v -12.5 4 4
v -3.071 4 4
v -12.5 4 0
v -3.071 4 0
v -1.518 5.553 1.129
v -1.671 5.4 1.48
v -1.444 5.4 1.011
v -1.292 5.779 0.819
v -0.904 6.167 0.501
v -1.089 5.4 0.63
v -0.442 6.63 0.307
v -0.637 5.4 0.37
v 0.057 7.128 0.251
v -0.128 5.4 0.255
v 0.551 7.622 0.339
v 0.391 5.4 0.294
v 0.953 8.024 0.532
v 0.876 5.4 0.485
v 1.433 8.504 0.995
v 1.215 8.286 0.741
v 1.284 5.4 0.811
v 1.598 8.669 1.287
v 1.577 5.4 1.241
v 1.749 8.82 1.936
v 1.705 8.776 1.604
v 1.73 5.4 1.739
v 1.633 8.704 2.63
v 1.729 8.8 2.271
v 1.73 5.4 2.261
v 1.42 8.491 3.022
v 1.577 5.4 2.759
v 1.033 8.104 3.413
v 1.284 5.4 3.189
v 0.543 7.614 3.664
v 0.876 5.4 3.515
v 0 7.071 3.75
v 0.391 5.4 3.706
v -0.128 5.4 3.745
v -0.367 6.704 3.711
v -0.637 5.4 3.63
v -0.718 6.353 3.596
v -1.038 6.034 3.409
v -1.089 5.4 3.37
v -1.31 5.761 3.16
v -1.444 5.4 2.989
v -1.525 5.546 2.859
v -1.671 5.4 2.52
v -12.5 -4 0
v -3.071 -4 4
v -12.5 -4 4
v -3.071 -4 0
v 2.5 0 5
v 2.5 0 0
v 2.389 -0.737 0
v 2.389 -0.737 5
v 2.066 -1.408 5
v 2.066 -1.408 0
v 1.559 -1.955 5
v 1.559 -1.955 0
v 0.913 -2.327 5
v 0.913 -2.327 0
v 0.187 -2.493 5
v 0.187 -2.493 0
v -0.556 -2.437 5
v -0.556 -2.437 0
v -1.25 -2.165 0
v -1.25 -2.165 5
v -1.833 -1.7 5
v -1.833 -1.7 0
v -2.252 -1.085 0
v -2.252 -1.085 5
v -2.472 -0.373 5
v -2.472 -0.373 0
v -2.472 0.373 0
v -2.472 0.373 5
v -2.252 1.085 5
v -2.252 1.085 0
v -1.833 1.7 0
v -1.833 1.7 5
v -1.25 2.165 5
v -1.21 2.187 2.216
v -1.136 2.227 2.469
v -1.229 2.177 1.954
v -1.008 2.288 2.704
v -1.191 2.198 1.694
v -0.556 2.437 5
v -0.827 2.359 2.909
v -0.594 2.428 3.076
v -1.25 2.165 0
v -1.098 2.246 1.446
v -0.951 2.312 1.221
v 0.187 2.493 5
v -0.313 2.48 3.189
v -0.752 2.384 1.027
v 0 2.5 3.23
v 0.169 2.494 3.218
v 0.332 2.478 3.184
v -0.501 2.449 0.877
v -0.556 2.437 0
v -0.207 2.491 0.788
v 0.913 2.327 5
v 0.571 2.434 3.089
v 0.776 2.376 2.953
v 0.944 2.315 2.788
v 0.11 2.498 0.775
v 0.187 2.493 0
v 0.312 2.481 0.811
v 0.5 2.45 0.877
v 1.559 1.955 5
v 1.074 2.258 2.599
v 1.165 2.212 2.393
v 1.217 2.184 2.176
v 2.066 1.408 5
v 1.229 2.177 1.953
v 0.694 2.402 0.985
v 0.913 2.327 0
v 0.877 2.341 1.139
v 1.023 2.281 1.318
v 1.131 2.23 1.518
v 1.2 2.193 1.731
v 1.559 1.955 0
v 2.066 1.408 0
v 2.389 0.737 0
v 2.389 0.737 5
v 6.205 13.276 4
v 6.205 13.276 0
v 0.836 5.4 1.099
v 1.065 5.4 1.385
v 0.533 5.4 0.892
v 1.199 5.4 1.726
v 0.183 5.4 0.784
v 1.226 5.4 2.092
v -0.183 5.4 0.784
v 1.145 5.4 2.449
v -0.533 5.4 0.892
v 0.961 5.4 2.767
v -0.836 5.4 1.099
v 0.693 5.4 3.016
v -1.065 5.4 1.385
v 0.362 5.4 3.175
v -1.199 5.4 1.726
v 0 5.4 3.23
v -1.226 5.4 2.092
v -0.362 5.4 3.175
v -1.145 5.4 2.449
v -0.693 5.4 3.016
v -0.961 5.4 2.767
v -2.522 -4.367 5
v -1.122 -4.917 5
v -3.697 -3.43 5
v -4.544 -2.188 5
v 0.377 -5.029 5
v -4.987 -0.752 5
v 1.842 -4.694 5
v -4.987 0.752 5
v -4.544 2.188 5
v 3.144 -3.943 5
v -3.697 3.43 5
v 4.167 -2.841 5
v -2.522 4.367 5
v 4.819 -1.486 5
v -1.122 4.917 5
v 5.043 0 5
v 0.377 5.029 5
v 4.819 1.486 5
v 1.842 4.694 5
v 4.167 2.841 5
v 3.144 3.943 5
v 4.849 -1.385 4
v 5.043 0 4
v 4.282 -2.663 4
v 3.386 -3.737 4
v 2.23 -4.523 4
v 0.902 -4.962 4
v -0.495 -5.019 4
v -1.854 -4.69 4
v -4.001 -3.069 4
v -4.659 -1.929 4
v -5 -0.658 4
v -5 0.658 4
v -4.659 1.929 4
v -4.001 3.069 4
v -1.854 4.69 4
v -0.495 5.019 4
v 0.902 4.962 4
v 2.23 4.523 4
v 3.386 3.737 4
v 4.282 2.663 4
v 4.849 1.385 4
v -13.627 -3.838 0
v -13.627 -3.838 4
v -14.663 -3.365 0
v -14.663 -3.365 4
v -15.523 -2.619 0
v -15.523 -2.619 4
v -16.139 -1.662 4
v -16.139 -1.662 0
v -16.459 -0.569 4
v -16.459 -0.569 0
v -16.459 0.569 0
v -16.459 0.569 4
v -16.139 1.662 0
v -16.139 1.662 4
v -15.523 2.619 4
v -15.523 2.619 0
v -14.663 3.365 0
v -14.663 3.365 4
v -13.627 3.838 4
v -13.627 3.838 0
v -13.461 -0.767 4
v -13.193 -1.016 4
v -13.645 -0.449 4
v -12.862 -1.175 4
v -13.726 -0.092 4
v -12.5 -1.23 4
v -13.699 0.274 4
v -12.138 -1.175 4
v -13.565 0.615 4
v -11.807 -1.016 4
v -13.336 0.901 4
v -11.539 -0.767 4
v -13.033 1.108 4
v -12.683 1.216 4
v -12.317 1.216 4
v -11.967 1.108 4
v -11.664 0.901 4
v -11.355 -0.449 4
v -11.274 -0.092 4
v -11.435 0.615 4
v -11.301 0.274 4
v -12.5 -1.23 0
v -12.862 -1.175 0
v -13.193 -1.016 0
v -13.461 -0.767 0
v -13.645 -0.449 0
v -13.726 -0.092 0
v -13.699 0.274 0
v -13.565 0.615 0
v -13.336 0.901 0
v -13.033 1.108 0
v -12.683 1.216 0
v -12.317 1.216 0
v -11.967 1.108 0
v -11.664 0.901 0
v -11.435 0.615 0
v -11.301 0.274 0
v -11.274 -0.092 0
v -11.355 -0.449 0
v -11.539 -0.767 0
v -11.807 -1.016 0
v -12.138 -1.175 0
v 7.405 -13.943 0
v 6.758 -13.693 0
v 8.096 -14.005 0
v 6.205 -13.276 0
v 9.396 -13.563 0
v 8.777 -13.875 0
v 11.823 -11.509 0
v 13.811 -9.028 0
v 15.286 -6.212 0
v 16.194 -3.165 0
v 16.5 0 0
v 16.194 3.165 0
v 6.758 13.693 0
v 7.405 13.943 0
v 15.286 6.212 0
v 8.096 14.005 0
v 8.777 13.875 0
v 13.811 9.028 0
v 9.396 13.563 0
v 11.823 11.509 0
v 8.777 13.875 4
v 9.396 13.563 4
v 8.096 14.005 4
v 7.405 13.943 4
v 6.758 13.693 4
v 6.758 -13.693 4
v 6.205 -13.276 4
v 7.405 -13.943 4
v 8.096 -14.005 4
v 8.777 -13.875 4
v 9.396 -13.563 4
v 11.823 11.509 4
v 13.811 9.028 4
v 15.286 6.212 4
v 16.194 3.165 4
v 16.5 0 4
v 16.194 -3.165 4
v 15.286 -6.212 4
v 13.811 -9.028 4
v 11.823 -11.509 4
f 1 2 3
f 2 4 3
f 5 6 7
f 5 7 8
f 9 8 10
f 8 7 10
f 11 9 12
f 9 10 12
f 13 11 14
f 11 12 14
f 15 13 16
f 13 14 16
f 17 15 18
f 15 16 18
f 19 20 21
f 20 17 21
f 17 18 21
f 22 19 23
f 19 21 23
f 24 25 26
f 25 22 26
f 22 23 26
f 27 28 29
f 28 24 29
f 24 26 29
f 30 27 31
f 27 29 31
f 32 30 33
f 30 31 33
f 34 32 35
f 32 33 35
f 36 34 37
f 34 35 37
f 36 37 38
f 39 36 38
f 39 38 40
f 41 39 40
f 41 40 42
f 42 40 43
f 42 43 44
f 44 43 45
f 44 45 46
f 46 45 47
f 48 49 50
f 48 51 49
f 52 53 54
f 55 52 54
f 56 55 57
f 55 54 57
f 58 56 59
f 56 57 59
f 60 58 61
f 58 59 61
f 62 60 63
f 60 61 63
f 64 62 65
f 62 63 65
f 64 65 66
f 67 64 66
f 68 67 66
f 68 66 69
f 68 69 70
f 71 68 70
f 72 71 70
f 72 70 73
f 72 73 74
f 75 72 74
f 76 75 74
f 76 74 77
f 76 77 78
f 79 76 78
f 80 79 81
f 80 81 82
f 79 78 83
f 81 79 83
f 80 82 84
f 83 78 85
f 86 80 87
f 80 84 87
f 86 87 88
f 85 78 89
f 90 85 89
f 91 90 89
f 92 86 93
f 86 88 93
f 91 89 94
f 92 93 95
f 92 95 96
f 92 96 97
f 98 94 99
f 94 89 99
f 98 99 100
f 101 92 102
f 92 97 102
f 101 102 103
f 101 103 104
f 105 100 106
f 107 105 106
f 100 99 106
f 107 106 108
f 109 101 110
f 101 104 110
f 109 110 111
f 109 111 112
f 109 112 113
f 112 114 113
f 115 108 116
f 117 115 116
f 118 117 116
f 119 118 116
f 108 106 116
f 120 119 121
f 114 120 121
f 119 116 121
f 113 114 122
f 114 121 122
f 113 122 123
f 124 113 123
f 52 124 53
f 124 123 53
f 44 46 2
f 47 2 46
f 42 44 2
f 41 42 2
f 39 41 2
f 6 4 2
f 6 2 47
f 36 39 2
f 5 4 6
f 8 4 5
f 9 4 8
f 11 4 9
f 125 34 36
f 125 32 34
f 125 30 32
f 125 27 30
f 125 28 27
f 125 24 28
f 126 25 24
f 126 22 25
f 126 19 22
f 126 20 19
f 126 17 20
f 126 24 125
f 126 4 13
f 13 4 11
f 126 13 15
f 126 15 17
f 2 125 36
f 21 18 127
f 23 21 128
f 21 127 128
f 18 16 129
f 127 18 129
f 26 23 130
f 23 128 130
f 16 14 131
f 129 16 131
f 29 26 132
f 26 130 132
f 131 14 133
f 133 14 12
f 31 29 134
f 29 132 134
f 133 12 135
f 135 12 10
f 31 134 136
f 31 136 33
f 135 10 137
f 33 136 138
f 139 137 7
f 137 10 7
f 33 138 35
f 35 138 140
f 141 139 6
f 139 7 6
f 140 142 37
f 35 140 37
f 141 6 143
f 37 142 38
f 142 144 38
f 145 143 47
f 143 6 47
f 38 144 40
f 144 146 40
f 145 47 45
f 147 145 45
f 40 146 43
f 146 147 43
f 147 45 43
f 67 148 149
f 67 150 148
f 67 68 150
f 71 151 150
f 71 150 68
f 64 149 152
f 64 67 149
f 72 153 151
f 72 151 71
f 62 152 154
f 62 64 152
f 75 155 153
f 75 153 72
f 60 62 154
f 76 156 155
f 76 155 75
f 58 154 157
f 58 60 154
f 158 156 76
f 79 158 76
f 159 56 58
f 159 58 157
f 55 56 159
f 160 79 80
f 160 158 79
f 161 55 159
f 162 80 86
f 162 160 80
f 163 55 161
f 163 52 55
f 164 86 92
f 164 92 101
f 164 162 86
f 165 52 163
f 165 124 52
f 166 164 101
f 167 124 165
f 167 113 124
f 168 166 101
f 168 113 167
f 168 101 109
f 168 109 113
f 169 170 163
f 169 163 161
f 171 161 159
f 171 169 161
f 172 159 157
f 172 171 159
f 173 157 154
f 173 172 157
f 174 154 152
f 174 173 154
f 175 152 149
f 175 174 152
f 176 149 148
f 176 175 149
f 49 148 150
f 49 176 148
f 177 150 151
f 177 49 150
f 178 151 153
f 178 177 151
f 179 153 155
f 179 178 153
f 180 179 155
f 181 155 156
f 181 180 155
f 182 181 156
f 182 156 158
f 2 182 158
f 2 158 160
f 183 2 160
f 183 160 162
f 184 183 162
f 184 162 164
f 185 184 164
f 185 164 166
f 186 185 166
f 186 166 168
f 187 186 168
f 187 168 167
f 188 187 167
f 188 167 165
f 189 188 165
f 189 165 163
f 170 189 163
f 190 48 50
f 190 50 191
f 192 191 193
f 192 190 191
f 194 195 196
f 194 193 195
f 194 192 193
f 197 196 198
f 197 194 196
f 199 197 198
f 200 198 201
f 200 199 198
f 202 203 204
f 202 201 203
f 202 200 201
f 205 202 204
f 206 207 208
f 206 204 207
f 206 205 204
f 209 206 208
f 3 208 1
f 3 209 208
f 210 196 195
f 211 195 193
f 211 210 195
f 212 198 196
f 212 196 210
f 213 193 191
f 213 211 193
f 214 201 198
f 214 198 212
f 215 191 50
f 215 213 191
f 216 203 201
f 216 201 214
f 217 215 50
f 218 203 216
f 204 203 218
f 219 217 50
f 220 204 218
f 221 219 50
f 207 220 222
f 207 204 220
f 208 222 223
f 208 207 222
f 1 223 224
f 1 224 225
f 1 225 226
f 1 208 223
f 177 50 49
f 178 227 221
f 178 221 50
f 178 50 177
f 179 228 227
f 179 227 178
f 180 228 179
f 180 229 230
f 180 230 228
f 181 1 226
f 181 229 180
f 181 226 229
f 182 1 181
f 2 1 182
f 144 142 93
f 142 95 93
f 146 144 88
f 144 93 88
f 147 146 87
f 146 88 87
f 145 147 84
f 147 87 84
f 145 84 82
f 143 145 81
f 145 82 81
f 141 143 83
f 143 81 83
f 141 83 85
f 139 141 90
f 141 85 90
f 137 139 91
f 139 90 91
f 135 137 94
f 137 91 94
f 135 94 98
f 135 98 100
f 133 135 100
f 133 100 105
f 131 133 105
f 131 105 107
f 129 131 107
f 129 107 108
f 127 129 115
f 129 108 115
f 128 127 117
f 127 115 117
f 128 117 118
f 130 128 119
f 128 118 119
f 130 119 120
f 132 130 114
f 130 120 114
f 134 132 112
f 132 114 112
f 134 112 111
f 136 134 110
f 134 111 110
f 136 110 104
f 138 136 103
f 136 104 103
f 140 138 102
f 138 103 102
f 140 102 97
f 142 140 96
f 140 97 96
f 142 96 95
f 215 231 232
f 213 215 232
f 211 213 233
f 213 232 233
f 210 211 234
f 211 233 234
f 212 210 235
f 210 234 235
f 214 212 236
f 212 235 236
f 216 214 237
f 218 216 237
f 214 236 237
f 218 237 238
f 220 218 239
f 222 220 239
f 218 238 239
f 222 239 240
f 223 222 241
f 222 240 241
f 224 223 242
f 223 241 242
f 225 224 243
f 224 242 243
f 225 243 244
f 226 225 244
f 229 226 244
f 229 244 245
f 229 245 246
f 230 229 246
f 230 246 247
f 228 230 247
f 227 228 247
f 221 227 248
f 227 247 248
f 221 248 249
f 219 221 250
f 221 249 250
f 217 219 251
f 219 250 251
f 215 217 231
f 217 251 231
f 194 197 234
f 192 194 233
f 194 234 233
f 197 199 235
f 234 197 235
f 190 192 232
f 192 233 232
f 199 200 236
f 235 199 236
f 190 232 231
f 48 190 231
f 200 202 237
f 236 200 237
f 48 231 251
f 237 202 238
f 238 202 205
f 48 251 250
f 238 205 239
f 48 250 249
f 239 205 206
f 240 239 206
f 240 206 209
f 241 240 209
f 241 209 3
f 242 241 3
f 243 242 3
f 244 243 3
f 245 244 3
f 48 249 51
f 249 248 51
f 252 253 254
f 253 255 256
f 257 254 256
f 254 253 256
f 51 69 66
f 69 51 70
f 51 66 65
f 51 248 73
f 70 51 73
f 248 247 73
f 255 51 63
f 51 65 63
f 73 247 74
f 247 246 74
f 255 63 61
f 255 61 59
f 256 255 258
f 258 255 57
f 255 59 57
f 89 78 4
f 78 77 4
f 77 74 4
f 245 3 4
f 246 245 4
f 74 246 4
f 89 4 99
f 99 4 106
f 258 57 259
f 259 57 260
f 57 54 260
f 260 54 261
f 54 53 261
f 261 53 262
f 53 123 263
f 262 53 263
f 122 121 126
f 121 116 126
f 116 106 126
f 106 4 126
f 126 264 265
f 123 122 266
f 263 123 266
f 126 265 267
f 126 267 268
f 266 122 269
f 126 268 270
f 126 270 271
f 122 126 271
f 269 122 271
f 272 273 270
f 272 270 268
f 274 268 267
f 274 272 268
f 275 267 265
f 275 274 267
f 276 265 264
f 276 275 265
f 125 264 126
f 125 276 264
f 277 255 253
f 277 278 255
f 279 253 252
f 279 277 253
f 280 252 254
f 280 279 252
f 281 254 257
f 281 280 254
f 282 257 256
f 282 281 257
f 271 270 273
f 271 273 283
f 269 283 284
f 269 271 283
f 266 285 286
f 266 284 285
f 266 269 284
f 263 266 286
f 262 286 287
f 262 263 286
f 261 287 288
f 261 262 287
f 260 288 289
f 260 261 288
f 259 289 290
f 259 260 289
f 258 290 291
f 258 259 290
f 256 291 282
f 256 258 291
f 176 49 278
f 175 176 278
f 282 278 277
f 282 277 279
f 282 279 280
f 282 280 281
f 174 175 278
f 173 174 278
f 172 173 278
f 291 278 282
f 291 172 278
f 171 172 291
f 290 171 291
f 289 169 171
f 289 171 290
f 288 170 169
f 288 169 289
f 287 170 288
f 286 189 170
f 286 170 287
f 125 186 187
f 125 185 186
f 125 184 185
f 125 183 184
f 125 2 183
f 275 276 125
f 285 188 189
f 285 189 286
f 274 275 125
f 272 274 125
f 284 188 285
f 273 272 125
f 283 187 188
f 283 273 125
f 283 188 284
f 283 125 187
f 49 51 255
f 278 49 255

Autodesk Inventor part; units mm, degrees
ref_plane "YZ Plane" through (0, 0, 0) normal (1, 0, 0) x (0, 1, 0)
ref_plane "XZ Plane" through (0, 0, 0) normal (0, 1, 0) x (-1, 0, 0)
sketch "Skizze1" plane through (0, 0, 0) normal (0, 0, 1) x (1, 0, 0)
  line L0 (0, -20.5159) -> (0, 20.5159) projected
  line L1 (-23.1, 0) -> (23.1, 0) projected
  circle A0 centre (0, 0) radius 2.5
  arc A1 (-3, 4) -> (-3, -4) centre (0, 0) ccw
  arc A2 (7.5831, -14.6542) -> (7.5831, 14.6542) centre (0, 0) ccw
  line L2 (-3.5355, 3.5355) -> (7.5831, 14.6542)
  line L3 (-3.5355, -3.5355) -> (7.5831, -14.6542)
  line L4 (-3, 4) -> (-12.5, 4)
  line L5 (-3, -4) -> (-12.5, -4)
  arc A3 (-12.5, 4) -> (-12.5, -4) centre (-12.5, 0) ccw
  dimension "d0" = 5
  dimension "d1" = 10
  dimension "d3" = 33
  dimension "d4" = 90
  dimension "d5" = 4
  dimension "d6" = 12.5
extrude "Extrusion1" add sketch "Skizze1" along normal blind 4 contours L3 L5 A1 L1 A0 L0 | L0 A0 L1 A2 L3 | L5 A3 L1 A1 L3 | L3 A1 L5 | L1 A1 L4 L2 L0 A0 | A0 L0 L2 A2 L1 | L1 A3 L4 L2 A1 | L2 L4 A1
fillet "Rundung1" radius 2.5 2 edges at (7.5831, 14.6542, 2) (7.5831, -14.6542, 2)
sketch "Skizze2" plane through (0, 0, 4) normal (0, 0, 1) x (1, 0, 0)
  arc A0 (-12.5, 4) -> (-12.5, -4) centre (-12.5, 0) ccw projected
  point P0 (0, 0)
hole "Bohrung1" at (-12.5, 0, 4) direction (0, 0, -1) diameter 2.459 end through all thread size "M3x0.5" class "6H" standard "ISO Metric profile"
sketch "Skizze3" plane through (0, 0, 4) normal (0, 0, 1) x (1, 0, 0)
  line L0 (0, -19.6114) -> (0, 19.6114) projected
  line L1 (-23.1, 0) -> (23.1, 0) projected
  line L2 (-12.5, -4) -> (-3.0711, -4) projected
  circle A0 centre (0, 0) radius 5.043
  circle A1 centre (0, 0) radius 2.5
  dimension "d17" = 5
extrude "Extrusion2" add sketch "Skizze3" along normal blind 1 contours A0 L1 A1 L0 | L0 A1 L1 A0 | L1 A1 L0 A0 | L1 A0 L0 A1
ref_plane "Arbeitsebene1" through (0, 10, 0) normal (0, 1, 0) x (-1, 0, 0)
sketch "Skizze7" plane through (0, 10, 0) normal (0, 1, 0) x (-1, 0, 0)
  line L0 (0, -1) -> (0, 6) projected
  line L1 (23.1, 0) -> (-23.1, 0) projected
  line L2 (12.5, 0) -> (12.5, 4) projected
  point P0 (0, 0)
  point P1 (0, 2)
  dimension "d30" = 2
hole "Bohrung3" at (0, 10, 2) direction (0, -1, 0) diameter 3.5 depth 4.6
sketch "Skizze8" plane through (0, 5.4, 2) normal (0, 1, 0) x (1, 0, 0)
  line L0 (0, 3) -> (0, -4) projected
  line L1 (23.1, 2) -> (-23.1, 2) projected
  point P0 (0, 2)
  point P1 (0, 0)
  dimension "d38" = 2
hole "Bohrung4" at (0, 5.4, 2) direction (0, -1, 0) diameter 2.459 end up to surface thread size "M3x0.5" class "6H" standard "ISO Metric profile"
properties part number "Kurbel 20"
